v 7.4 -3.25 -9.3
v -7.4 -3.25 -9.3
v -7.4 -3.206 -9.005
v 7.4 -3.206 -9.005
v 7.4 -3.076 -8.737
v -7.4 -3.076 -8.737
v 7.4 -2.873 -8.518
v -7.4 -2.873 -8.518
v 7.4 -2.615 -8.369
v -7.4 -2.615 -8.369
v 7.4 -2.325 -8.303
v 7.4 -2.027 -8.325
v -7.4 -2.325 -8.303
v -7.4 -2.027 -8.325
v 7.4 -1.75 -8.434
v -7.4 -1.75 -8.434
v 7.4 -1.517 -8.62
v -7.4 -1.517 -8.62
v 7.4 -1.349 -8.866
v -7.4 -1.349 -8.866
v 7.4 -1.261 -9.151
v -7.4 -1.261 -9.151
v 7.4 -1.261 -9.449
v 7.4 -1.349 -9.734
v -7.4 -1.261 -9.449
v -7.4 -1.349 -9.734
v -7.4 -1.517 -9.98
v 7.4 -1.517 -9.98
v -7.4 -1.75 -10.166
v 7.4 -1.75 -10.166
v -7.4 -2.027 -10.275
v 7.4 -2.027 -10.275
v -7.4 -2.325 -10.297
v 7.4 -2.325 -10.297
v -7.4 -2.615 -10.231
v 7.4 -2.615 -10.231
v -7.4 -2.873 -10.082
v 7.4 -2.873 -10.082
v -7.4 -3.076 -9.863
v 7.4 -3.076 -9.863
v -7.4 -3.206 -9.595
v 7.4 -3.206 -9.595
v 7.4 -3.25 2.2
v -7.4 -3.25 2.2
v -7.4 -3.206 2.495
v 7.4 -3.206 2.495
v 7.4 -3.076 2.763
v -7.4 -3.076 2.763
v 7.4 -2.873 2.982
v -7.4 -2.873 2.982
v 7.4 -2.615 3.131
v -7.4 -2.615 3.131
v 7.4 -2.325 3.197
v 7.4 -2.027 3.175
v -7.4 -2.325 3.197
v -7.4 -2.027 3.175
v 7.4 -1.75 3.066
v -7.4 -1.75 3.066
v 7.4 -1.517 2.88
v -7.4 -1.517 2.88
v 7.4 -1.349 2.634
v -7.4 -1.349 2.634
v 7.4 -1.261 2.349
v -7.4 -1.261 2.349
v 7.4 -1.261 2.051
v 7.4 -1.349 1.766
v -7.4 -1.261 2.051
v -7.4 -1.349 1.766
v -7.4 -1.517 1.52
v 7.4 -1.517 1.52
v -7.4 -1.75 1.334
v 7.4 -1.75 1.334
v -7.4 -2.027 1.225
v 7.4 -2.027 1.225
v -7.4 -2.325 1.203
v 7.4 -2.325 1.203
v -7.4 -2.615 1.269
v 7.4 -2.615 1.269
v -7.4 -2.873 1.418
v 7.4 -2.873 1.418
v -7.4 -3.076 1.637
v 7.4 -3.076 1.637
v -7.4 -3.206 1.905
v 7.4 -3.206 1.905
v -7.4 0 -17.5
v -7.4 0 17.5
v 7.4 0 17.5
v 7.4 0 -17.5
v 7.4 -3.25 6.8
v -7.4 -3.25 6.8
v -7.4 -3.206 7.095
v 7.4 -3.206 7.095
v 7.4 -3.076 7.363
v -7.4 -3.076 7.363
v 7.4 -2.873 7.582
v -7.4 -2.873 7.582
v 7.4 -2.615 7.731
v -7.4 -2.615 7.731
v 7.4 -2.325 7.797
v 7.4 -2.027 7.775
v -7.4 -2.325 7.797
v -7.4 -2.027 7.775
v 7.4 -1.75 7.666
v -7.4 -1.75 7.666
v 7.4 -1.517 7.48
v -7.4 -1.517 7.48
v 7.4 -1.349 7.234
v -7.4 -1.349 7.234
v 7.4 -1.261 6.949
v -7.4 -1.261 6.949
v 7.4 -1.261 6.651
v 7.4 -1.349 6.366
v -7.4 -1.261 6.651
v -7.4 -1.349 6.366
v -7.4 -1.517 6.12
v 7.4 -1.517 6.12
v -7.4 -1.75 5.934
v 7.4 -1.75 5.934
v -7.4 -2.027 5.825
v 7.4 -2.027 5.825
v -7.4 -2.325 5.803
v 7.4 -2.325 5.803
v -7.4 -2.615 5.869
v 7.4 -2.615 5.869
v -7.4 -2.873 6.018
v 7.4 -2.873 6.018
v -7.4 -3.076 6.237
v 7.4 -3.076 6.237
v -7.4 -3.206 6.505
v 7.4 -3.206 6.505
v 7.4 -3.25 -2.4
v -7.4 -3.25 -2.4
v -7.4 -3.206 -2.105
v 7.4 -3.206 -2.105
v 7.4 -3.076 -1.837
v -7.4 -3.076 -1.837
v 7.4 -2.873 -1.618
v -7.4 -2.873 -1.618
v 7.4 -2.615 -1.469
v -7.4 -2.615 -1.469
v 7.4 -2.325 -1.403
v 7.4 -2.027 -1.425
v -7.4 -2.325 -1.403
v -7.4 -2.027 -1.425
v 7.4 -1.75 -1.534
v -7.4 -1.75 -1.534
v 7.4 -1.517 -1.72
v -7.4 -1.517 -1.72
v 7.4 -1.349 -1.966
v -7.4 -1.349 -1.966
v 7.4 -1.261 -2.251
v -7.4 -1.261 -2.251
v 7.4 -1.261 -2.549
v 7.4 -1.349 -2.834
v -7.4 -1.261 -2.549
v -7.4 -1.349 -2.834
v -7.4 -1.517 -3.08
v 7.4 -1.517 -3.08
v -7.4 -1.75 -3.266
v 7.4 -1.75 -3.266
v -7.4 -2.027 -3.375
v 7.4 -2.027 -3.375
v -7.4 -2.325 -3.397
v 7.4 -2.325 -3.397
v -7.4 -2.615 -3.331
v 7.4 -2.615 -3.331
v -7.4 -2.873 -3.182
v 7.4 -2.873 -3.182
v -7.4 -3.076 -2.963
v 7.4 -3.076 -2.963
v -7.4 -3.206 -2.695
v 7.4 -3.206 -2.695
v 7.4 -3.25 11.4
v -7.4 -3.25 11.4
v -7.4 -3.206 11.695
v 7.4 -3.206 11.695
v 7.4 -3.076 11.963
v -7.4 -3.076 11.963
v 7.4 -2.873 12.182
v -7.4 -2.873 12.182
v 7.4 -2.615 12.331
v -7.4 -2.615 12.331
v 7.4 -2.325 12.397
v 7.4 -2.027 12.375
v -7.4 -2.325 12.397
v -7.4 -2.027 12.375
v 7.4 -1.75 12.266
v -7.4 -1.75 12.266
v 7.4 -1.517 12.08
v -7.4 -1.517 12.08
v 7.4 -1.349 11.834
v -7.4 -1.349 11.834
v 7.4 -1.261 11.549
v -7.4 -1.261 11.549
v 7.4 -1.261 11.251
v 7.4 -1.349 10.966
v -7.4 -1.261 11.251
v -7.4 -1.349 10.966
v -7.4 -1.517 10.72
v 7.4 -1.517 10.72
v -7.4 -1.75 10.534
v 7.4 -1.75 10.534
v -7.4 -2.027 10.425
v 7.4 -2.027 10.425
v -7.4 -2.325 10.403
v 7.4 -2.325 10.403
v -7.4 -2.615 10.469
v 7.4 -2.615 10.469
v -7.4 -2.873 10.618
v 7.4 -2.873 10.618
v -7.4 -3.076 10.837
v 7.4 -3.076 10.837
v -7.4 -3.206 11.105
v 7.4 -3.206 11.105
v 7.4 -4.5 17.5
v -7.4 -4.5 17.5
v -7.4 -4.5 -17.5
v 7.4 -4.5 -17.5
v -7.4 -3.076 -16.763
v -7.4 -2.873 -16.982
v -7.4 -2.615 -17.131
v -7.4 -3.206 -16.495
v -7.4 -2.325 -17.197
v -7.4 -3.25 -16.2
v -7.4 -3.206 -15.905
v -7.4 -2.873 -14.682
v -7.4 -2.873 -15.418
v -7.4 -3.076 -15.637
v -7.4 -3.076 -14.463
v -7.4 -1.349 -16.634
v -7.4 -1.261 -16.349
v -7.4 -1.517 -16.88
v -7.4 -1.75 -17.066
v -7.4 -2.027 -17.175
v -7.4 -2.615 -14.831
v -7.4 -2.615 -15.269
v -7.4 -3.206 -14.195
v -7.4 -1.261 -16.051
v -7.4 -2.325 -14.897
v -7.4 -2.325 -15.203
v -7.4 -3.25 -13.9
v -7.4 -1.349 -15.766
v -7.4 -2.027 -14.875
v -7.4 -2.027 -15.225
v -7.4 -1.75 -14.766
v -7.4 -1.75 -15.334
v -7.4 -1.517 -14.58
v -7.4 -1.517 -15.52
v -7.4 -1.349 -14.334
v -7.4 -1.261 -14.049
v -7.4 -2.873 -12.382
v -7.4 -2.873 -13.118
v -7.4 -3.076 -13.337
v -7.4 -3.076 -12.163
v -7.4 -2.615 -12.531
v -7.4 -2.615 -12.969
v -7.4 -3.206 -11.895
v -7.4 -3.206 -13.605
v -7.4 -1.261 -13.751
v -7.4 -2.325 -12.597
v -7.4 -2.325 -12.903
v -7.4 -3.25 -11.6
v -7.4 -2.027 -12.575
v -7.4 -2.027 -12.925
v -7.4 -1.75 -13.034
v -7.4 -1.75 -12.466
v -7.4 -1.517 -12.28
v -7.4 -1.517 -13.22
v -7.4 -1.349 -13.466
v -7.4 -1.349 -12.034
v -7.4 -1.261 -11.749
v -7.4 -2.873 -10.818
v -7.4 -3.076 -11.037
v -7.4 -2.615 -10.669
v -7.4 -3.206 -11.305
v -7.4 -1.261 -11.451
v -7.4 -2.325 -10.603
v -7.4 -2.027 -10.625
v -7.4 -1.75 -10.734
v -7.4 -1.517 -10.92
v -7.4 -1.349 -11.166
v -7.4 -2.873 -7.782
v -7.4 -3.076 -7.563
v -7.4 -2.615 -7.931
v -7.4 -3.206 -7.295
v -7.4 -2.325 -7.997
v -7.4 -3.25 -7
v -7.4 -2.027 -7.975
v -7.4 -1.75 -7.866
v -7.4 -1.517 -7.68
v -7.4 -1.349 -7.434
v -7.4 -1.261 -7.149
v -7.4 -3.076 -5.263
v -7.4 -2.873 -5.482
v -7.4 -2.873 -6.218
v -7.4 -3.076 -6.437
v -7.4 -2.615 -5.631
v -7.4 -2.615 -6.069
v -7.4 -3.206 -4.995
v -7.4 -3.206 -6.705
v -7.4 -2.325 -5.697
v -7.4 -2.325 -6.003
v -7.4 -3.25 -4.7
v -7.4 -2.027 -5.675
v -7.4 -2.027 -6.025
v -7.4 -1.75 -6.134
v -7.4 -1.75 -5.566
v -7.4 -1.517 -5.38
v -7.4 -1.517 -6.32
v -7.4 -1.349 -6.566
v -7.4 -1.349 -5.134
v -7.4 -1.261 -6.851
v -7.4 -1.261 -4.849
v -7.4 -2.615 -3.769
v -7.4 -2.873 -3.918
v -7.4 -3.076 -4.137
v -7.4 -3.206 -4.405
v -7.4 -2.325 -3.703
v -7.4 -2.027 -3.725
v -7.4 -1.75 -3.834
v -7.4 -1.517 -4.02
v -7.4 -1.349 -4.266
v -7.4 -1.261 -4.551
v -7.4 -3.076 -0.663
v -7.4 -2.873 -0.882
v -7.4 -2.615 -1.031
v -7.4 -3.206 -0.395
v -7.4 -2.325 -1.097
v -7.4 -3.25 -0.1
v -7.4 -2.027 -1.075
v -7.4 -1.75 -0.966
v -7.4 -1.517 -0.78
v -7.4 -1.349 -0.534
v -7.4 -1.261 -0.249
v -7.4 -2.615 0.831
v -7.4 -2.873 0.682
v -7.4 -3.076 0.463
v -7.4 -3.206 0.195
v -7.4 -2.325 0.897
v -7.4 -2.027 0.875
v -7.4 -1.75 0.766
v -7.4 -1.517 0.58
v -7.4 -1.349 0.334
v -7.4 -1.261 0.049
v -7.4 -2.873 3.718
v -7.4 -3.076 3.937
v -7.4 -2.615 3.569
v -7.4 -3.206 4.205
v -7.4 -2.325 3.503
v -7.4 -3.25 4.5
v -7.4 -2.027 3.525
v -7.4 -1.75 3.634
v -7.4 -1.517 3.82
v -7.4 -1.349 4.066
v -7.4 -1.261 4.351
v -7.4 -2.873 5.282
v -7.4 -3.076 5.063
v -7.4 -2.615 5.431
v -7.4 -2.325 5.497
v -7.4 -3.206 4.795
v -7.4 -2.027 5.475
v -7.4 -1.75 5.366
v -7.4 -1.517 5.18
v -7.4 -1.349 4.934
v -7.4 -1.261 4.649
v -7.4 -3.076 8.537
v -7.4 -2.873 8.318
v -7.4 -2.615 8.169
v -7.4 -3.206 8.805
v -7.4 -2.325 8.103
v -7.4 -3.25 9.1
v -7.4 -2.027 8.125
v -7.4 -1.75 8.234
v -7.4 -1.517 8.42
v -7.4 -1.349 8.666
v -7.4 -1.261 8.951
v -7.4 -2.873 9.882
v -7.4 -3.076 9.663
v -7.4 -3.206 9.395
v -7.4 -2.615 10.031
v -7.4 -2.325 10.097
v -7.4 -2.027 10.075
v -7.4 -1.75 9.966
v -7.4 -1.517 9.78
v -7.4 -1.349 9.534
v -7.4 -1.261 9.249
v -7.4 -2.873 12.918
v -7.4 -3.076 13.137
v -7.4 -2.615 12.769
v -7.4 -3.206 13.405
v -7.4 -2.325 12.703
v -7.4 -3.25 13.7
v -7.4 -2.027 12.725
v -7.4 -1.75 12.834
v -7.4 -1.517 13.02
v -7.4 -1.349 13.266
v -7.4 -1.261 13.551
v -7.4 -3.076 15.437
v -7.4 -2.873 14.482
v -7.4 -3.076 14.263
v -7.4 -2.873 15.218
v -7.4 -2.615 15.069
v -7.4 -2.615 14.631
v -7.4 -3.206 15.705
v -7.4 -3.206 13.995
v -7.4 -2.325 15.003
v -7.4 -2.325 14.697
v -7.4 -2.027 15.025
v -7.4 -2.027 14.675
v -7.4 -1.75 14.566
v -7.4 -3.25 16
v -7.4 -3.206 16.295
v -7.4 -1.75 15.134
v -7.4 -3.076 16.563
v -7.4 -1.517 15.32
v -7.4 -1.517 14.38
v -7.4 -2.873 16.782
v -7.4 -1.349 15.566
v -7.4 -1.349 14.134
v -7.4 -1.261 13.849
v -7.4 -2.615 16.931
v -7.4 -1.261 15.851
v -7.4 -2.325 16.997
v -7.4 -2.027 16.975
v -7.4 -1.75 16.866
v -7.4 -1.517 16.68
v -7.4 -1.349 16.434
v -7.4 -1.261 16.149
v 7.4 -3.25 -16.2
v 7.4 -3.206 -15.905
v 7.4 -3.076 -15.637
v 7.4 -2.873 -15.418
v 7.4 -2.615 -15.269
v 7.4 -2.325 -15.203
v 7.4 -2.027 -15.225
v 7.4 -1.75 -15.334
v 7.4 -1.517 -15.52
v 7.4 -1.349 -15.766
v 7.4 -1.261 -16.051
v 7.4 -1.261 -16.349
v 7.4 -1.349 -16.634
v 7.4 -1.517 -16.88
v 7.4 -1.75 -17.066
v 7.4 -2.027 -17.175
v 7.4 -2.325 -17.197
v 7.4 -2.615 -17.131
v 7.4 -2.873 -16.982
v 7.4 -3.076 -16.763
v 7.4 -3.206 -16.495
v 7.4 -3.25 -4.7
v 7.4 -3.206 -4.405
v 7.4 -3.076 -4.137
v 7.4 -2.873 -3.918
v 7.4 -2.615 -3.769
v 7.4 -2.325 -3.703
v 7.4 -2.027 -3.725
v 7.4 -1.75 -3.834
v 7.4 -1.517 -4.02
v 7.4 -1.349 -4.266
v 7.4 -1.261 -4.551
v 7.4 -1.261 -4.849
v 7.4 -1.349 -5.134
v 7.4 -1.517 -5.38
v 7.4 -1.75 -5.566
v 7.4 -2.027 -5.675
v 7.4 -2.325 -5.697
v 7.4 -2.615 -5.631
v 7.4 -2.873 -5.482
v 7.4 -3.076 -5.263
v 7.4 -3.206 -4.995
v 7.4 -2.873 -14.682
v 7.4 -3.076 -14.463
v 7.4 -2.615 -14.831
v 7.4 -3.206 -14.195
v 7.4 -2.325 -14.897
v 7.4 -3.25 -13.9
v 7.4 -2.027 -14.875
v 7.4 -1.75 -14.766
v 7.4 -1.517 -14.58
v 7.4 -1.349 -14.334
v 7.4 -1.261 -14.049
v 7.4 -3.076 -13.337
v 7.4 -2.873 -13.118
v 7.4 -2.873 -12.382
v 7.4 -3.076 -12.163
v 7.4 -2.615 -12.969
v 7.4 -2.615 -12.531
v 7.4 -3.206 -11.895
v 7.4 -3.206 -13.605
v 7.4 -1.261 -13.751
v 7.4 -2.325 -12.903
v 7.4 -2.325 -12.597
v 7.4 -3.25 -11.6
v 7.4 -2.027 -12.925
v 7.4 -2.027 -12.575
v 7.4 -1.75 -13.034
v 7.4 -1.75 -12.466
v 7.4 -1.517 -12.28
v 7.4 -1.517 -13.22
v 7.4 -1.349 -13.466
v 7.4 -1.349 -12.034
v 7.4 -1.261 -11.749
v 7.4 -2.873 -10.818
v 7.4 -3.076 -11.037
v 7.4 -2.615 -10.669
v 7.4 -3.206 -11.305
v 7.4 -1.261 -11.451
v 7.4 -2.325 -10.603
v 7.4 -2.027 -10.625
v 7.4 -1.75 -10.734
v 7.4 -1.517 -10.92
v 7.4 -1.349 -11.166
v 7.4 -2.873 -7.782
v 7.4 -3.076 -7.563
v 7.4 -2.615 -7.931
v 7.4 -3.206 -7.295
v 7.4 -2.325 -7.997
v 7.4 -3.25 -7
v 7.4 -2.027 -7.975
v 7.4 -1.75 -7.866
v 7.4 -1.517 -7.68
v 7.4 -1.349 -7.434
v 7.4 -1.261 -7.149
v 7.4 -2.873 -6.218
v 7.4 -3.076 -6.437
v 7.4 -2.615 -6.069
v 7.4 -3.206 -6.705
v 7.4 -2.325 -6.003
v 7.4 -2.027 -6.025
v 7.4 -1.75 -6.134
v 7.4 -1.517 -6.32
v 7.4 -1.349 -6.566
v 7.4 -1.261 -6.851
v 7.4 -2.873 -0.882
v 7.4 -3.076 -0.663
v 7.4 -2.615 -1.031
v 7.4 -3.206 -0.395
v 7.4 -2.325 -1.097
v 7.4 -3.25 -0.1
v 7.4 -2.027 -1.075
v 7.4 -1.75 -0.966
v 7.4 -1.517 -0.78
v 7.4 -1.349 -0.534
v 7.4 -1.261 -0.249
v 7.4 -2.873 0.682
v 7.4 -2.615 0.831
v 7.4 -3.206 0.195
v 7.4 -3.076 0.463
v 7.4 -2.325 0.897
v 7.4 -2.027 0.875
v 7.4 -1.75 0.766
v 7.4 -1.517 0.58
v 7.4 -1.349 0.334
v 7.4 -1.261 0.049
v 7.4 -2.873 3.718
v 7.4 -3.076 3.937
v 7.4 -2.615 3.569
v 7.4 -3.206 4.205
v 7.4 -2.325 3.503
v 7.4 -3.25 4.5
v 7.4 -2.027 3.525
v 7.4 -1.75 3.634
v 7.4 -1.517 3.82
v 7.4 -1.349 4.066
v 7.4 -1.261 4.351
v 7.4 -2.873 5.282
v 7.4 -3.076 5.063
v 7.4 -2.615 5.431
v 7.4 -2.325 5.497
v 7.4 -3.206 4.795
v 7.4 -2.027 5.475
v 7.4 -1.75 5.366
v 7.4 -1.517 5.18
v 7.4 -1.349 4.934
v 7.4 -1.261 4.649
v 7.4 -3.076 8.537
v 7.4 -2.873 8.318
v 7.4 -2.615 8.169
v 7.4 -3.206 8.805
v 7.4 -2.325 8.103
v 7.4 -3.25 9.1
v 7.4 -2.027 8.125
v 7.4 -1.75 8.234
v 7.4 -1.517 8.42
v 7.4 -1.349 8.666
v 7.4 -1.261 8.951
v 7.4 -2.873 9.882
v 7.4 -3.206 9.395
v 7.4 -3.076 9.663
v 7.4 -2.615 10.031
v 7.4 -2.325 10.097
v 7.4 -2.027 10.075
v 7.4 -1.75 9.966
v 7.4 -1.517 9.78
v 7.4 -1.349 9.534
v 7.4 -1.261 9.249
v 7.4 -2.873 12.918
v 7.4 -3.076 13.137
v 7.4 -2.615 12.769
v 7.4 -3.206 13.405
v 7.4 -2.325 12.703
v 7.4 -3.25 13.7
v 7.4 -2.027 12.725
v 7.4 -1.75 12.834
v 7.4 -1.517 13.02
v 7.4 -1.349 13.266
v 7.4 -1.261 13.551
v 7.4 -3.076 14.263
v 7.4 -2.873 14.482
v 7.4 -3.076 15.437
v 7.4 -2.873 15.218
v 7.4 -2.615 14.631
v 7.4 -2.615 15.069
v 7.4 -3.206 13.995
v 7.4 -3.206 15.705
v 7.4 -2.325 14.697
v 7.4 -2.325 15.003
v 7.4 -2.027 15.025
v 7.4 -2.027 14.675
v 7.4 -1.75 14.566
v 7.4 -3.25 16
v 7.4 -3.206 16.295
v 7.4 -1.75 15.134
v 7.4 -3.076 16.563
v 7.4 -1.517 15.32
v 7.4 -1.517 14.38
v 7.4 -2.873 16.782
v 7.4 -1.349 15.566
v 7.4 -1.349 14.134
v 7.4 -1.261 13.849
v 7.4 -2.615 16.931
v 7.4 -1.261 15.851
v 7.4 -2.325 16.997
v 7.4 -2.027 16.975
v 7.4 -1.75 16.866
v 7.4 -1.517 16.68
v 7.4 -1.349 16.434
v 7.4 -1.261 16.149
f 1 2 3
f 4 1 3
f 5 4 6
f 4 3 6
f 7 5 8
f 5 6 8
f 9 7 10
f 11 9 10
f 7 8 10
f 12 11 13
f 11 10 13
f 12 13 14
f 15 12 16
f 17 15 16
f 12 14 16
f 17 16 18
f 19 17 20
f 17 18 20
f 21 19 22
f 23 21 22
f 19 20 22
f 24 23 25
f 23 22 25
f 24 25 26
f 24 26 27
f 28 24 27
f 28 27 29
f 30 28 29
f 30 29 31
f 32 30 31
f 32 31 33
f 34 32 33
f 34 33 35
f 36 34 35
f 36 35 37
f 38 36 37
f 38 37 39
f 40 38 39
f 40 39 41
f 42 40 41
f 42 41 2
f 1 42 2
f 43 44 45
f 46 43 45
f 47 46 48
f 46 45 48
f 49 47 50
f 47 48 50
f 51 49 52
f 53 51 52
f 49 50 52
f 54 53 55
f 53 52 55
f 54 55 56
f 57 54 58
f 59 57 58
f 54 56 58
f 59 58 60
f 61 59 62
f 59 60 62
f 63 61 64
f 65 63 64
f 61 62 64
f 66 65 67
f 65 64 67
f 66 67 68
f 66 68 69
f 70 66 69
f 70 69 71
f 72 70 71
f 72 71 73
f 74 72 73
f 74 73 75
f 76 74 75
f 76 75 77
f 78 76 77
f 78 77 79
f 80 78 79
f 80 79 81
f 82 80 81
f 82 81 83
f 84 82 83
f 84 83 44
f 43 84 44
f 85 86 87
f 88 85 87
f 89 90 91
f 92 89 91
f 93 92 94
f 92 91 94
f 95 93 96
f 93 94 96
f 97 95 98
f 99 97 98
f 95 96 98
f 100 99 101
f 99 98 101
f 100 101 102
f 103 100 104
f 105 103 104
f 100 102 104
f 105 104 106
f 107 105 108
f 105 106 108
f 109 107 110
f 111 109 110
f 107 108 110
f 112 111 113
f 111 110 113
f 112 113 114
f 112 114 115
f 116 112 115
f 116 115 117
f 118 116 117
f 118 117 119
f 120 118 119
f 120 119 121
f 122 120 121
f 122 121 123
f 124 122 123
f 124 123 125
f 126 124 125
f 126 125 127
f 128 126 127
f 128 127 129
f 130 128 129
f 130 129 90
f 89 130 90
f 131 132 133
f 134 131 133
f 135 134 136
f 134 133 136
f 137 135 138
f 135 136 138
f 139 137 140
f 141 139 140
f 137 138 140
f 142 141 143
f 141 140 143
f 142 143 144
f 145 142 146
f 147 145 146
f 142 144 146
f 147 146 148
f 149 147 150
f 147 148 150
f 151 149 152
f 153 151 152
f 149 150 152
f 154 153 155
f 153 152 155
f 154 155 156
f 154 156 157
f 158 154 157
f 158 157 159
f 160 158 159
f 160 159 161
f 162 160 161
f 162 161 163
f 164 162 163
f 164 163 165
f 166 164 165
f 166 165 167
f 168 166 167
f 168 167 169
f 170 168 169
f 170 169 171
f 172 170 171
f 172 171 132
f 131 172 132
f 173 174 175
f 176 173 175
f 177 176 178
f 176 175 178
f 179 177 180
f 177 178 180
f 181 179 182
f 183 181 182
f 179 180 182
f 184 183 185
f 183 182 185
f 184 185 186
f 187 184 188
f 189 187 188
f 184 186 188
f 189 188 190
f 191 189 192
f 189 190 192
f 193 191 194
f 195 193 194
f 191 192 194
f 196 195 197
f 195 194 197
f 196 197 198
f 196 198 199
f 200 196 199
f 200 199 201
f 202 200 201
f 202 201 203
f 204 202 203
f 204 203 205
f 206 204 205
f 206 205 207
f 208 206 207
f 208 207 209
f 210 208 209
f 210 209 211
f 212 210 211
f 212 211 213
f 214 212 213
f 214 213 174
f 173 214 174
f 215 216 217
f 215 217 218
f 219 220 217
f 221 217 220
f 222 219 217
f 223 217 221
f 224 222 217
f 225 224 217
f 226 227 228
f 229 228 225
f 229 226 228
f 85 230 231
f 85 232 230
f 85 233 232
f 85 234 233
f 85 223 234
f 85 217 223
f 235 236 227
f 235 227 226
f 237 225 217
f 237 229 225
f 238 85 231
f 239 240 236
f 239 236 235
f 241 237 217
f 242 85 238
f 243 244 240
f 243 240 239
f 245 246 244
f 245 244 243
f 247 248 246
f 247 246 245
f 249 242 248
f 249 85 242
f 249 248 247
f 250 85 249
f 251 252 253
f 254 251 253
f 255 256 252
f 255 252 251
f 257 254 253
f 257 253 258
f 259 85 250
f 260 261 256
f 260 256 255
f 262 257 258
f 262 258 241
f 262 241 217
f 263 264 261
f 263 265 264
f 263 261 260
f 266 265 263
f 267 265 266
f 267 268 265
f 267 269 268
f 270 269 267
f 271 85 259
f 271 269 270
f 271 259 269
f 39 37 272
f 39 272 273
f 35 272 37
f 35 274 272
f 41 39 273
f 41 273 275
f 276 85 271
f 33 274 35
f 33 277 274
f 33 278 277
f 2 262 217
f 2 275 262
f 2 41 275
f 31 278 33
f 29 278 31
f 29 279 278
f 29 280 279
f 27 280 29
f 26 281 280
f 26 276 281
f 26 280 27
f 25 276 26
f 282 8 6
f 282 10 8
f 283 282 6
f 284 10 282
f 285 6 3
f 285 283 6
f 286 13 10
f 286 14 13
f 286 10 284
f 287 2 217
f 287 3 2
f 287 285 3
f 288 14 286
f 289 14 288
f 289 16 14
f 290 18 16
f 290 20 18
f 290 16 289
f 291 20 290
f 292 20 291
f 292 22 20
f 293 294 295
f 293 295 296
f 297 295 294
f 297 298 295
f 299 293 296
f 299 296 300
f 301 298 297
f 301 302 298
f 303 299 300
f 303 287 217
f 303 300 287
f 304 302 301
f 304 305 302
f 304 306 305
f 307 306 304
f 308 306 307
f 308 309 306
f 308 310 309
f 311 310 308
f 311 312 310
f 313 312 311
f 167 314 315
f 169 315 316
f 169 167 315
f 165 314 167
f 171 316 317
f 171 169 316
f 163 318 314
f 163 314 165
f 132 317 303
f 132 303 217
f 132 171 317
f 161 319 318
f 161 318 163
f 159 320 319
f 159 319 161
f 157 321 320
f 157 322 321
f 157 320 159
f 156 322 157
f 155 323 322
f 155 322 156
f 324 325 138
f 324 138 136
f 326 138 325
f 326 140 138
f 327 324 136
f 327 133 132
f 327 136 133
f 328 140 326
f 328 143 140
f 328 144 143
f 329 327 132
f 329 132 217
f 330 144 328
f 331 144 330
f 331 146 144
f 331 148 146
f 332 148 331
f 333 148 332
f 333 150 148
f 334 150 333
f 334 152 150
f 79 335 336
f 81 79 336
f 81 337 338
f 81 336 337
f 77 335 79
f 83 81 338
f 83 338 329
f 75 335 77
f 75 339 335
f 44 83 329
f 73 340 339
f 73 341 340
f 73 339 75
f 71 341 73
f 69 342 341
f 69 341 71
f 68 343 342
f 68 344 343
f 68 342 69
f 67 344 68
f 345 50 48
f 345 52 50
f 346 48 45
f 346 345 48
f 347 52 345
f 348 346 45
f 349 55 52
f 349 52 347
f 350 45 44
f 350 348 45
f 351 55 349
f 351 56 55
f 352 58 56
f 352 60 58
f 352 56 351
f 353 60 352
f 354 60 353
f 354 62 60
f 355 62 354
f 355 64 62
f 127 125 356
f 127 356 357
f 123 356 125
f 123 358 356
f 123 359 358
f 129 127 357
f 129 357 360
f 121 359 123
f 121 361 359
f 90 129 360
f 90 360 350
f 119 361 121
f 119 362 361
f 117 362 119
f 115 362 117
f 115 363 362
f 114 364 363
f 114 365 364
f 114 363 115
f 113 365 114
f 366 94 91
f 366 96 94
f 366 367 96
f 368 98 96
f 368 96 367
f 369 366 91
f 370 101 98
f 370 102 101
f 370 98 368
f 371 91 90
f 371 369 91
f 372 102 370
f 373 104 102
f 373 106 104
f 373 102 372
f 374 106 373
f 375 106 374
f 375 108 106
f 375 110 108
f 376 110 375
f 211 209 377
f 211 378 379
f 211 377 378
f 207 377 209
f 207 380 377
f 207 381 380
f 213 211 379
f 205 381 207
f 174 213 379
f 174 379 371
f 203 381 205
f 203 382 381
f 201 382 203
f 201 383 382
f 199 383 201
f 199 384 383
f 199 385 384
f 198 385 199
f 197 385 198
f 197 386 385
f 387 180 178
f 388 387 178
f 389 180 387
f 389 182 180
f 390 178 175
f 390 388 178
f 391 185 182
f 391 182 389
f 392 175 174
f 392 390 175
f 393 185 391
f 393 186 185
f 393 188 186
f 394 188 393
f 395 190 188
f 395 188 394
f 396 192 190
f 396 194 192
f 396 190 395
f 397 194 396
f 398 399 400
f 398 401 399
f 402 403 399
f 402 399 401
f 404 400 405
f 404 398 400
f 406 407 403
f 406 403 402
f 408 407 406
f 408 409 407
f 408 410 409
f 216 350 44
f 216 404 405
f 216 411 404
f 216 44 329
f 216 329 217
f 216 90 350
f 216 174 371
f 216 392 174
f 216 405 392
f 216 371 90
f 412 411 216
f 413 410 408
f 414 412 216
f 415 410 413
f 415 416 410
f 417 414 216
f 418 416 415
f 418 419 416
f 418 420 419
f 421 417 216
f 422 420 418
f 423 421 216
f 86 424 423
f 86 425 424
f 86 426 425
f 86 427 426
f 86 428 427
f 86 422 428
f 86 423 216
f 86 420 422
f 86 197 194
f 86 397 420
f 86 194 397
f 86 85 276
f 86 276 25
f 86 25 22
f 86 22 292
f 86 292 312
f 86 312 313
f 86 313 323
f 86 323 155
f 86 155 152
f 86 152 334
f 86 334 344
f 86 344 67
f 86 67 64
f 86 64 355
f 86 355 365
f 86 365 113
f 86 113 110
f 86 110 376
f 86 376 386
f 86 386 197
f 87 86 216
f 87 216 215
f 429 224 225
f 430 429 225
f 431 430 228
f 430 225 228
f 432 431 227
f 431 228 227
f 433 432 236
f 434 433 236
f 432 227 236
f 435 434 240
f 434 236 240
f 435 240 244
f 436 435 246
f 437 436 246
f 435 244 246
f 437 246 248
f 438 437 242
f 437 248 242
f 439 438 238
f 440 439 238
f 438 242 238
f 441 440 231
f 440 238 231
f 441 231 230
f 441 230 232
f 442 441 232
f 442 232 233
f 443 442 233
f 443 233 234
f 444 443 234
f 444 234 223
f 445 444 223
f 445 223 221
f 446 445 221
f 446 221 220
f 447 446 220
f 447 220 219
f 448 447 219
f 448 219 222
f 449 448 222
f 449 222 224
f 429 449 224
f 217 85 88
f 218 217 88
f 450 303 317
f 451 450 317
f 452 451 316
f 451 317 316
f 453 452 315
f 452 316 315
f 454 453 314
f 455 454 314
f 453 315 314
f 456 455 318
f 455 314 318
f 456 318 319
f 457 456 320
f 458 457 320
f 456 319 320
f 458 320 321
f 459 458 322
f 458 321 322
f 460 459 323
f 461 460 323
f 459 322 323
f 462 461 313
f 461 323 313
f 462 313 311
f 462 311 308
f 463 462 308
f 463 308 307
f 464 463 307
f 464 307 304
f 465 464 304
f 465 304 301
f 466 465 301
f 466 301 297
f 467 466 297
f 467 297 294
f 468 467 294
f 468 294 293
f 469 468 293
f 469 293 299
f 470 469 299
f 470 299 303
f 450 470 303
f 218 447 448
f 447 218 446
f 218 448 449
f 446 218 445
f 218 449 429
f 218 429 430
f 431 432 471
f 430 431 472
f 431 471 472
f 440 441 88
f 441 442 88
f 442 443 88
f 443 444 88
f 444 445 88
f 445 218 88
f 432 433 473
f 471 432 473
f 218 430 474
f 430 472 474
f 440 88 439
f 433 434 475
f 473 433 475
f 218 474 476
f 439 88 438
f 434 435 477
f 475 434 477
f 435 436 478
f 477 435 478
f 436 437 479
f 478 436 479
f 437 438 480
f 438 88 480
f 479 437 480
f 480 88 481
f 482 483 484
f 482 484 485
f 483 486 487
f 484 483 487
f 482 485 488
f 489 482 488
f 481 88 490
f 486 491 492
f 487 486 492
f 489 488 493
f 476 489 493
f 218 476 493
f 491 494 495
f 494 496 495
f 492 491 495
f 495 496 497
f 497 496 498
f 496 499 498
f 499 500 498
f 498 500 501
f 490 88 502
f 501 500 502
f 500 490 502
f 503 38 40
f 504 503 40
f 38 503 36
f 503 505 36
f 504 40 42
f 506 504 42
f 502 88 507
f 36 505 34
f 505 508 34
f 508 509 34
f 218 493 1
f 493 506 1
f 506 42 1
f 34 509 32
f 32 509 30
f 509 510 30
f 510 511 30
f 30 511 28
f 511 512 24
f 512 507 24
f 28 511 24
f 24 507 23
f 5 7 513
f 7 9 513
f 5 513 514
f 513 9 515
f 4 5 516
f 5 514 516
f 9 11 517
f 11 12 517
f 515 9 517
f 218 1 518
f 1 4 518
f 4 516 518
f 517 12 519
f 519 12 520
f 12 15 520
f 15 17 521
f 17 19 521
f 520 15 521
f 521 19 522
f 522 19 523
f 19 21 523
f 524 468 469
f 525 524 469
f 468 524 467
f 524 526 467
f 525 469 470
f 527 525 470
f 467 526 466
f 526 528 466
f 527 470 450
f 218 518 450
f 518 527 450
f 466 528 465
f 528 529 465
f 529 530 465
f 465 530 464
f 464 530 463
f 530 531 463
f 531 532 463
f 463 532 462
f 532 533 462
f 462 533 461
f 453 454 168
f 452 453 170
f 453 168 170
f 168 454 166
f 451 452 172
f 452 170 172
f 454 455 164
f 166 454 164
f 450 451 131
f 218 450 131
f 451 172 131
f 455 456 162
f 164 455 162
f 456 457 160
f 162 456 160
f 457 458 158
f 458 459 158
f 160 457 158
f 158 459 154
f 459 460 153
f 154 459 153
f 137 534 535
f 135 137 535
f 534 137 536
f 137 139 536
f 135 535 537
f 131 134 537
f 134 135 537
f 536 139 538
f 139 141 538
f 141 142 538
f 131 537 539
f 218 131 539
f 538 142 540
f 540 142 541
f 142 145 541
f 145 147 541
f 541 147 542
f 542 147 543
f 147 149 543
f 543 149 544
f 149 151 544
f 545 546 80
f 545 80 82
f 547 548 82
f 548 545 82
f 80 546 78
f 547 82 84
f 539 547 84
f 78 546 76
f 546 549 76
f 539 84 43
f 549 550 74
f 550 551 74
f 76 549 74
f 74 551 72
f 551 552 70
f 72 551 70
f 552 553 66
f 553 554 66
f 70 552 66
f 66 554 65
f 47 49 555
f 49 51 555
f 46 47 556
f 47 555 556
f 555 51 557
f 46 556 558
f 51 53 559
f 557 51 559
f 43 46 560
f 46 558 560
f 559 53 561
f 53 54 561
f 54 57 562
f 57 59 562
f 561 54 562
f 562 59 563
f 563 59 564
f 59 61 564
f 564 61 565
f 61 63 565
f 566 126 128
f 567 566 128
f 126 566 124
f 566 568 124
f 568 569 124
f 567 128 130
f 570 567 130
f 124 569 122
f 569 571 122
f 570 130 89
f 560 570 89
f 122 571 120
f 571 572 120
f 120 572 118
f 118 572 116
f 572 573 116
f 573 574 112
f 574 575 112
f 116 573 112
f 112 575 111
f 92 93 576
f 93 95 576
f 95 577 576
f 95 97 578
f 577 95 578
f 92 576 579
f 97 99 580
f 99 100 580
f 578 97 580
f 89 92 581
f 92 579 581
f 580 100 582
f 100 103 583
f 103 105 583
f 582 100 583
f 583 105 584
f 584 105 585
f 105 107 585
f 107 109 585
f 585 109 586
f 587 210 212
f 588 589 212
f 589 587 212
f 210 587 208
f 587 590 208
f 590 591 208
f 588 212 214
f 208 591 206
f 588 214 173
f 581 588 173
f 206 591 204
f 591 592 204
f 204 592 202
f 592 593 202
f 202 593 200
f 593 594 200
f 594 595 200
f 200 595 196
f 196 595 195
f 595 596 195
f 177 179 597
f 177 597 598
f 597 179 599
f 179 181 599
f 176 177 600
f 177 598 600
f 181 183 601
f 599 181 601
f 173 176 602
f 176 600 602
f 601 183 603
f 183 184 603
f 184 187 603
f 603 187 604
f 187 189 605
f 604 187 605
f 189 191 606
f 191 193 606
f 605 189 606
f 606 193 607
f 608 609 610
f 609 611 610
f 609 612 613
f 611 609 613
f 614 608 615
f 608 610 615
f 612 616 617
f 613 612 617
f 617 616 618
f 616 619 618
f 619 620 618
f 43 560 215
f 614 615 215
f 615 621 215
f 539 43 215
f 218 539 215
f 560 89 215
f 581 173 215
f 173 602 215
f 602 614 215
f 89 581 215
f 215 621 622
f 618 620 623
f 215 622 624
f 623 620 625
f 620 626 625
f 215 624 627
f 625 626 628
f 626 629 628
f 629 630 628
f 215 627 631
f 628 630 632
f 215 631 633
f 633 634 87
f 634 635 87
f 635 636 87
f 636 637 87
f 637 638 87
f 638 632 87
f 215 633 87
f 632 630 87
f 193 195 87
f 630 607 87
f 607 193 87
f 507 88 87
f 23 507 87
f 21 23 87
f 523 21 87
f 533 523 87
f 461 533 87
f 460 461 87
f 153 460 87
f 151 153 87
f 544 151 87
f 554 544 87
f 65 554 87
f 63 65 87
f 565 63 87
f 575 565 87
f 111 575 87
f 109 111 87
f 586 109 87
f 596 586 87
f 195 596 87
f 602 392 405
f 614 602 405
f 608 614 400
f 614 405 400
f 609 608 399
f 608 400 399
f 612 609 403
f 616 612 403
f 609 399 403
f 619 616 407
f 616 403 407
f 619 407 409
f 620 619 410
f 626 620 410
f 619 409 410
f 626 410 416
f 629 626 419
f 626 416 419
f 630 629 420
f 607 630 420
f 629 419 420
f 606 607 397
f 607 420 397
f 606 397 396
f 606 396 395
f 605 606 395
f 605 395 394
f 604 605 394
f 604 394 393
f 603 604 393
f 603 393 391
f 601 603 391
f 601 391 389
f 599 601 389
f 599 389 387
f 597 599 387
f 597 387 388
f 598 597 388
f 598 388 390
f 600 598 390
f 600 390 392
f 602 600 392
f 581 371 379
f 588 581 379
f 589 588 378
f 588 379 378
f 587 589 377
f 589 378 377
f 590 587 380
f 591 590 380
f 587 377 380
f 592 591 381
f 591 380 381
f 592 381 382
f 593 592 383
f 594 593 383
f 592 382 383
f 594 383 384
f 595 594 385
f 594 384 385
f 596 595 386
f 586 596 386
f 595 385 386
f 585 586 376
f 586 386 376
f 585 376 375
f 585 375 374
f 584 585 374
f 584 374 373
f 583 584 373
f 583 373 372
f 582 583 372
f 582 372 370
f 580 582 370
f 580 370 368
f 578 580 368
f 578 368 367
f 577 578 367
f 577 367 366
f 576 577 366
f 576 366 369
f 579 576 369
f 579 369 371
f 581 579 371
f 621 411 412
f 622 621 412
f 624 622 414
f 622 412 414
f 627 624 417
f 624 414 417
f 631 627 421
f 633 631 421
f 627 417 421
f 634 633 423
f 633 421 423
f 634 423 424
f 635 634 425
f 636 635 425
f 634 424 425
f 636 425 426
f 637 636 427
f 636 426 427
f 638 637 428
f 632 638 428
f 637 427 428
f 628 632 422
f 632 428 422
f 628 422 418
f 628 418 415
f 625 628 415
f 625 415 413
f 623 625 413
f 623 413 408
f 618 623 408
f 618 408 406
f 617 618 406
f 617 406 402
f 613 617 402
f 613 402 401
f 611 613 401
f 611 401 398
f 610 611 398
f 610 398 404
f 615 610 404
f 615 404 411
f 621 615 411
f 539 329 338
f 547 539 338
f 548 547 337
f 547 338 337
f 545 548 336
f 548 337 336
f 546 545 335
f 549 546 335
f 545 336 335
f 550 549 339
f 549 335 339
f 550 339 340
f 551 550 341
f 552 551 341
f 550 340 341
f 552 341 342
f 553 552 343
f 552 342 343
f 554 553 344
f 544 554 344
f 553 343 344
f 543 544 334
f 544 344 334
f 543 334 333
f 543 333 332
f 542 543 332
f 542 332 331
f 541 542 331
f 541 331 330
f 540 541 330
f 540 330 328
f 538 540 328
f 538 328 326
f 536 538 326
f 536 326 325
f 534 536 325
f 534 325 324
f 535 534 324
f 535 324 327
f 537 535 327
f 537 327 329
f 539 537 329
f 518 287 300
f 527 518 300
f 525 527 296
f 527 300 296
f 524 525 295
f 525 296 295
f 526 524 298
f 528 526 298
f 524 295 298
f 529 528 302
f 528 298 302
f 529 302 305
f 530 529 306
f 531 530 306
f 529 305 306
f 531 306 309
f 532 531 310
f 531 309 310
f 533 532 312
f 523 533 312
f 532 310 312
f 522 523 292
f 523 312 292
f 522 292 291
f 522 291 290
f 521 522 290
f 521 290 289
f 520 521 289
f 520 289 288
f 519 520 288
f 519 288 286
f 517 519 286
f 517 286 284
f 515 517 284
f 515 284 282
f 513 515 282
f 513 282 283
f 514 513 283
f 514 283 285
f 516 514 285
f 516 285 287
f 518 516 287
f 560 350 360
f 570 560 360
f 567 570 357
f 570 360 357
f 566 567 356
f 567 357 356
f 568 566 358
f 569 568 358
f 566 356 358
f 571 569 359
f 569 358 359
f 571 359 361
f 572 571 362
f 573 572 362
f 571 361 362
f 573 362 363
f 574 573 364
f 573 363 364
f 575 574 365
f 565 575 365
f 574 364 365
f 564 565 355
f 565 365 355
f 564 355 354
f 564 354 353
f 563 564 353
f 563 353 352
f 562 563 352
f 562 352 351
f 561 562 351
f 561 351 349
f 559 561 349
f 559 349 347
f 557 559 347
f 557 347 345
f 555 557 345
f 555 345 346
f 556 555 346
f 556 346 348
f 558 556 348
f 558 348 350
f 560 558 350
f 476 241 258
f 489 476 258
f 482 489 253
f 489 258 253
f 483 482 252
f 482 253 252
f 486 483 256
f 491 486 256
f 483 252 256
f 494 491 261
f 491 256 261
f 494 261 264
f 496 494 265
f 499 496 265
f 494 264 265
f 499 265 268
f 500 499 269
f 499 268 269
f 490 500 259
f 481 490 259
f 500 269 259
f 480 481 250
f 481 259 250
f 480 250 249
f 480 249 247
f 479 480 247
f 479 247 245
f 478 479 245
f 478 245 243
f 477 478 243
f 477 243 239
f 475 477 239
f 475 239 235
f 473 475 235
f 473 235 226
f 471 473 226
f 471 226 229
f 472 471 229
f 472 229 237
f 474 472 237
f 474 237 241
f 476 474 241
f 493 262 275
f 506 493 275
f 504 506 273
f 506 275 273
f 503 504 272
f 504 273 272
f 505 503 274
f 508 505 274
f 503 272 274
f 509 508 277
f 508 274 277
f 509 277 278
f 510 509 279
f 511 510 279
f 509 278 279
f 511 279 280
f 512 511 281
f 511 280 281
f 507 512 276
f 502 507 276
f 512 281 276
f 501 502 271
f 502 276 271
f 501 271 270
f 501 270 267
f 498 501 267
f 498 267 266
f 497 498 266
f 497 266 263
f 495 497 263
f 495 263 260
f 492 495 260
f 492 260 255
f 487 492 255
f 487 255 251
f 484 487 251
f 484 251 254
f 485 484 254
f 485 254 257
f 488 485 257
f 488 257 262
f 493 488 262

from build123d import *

# Parameters (mm, degrees)
F0_W     = 14.8
F0_H     = 35
F1_DEPTH = 4.5
F2_R     = 1
F3_DEPTH = 14.801


with BuildPart() as f1:
    # F0 (on Front) → F1 (new body)
    with BuildSketch(Plane.XZ):
        Rectangle(F0_W, F0_H)
    extrude(amount=F1_DEPTH)

    # F2 (on face) → F3 (cut, through all)
    with BuildSketch(Plane(origin=(-7.4, 0, 0), x_dir=(0, -1, 0), z_dir=(-1, 0, 0))):
        with Locations((2.25, 16)):
            Circle(F2_R)
        with Locations((2.25, 13.7)):
            Circle(F2_R)
        with Locations((2.25, 11.4)):
            Circle(F2_R)
        with Locations((2.25, 9.1)):
            Circle(F2_R)
        with Locations((2.25, 6.8)):
            Circle(F2_R)
        with Locations((2.25, 4.5)):
            Circle(F2_R)
        with Locations((2.25, 2.2)):
            Circle(F2_R)
        with Locations((2.25, -0.1)):
            Circle(F2_R)
        with Locations((2.25, -2.4)):
            Circle(F2_R)
        with Locations((2.25, -4.7)):
            Circle(F2_R)
        with Locations((2.25, -7)):
            Circle(F2_R)
        with Locations((2.25, -9.3)):
            Circle(F2_R)
        with Locations((2.25, -11.6)):
            Circle(F2_R)
        with Locations((2.25, -13.9)):
            Circle(F2_R)
        with Locations((2.25, -16.2)):
            Circle(F2_R)
    extrude(amount=-F3_DEPTH, mode=Mode.SUBTRACT)


solid = f1.part
